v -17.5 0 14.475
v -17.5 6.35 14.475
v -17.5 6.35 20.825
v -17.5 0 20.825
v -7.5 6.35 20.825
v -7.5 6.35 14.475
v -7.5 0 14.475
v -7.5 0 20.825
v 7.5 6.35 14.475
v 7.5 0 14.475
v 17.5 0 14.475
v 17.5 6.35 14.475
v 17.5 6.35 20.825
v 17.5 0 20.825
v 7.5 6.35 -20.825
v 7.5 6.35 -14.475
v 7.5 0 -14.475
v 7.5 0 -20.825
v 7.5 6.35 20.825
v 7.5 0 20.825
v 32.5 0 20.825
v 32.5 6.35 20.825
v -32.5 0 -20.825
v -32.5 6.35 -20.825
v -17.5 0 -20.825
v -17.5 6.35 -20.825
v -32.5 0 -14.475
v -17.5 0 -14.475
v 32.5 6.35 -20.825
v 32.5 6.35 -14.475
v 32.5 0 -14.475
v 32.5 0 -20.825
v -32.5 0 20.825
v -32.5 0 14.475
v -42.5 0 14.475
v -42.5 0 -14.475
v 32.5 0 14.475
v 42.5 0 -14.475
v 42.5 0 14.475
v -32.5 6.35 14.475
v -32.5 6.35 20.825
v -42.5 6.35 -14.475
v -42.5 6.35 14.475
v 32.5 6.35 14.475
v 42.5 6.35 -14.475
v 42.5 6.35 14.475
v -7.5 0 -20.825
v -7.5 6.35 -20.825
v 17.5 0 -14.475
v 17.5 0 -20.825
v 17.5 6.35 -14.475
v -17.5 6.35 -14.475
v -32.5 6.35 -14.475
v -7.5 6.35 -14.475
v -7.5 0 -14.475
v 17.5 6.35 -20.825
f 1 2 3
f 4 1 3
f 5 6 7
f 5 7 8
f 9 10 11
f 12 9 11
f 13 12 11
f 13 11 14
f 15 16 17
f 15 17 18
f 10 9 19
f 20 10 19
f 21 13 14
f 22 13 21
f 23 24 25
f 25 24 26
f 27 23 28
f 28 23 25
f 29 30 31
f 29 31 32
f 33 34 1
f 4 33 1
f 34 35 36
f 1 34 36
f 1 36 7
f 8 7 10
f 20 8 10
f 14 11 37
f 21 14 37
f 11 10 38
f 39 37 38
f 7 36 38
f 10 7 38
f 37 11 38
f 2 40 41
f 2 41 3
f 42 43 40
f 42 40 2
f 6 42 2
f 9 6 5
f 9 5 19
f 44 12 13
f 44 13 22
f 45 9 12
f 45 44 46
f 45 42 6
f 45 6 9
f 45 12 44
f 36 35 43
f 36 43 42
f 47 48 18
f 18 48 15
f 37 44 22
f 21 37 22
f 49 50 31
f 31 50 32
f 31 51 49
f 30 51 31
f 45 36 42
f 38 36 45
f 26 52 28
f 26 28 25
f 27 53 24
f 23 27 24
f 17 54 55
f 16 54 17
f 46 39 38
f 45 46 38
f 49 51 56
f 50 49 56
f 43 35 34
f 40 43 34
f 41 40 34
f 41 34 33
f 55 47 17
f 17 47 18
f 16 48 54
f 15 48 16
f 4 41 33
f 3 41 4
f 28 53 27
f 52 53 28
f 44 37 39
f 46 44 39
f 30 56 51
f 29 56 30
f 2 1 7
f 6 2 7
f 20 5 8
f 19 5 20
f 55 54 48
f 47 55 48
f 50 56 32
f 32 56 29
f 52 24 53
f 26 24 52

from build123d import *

# Parameters (mm, degrees)
ESQUISSE1_W          = 85
ESQUISSE1_H          = 28.95
BOSS_EXTRU_1_DEPTH   = 6.35
ESQUISSE2_W          = 15
ESQUISSE2_H          = 6.35
BOSS_EXTRU_2_DEPTH   = 6.35
BOSS_EXTRU_2_2_DEPTH = 6.35
BOSS_EXTRU_2_3_DEPTH = 6.35


with BuildPart() as part:
    # Esquisse1 → Boss.-Extru.1 (new body)
    with BuildSketch(Plane(origin=(0, 0, 0), x_dir=(1, 0, 0), z_dir=(0, 1, 0))):
        Rectangle(ESQUISSE1_W, ESQUISSE1_H)
    extrude(amount=BOSS_EXTRU_1_DEPTH)


with BuildPart() as body_2:
    # Esquisse2 → Boss.-Extru.2 (new body)
    with BuildSketch(Plane(origin=(0, 6.35, 0), x_dir=(1, 0, 0), z_dir=(0, 1, 0))):
        with Locations((-25, 17.65)):
            Rectangle(ESQUISSE2_W, ESQUISSE2_H)
    boss_extru_2 = extrude(amount=-BOSS_EXTRU_2_DEPTH)


with BuildPart() as body_3:
    # Esquisse2 → Boss.-Extru.2 2 (new body)
    with BuildSketch(Plane(origin=(0, 6.35, 0), x_dir=(1, 0, 0), z_dir=(0, 1, 0))):
        with Locations((0, 17.65)):
            Rectangle(ESQUISSE2_W, ESQUISSE2_H)
    boss_extru_2_2 = extrude(amount=-BOSS_EXTRU_2_2_DEPTH)


with BuildPart() as body_4:
    # Esquisse2 → Boss.-Extru.2 3 (new body)
    with BuildSketch(Plane(origin=(0, 6.35, 0), x_dir=(1, 0, 0), z_dir=(0, 1, 0))):
        with Locations((25, 17.65)):
            Rectangle(ESQUISSE2_W, ESQUISSE2_H)
    boss_extru_2_3 = extrude(amount=-BOSS_EXTRU_2_3_DEPTH)


with BuildPart() as part_1:
    add(part.part)

    # Symétrie1: Boss.-Extru.2, Boss.-Extru.2 2, Boss.-Extru.2 3 across plane
    add(boss_extru_2.mirror(Plane.XY))
    add(boss_extru_2_2.mirror(Plane.XY))
    add(boss_extru_2_3.mirror(Plane.XY))


solid = Compound([body_2.part, body_3.part, body_4.part, part_1.part])
